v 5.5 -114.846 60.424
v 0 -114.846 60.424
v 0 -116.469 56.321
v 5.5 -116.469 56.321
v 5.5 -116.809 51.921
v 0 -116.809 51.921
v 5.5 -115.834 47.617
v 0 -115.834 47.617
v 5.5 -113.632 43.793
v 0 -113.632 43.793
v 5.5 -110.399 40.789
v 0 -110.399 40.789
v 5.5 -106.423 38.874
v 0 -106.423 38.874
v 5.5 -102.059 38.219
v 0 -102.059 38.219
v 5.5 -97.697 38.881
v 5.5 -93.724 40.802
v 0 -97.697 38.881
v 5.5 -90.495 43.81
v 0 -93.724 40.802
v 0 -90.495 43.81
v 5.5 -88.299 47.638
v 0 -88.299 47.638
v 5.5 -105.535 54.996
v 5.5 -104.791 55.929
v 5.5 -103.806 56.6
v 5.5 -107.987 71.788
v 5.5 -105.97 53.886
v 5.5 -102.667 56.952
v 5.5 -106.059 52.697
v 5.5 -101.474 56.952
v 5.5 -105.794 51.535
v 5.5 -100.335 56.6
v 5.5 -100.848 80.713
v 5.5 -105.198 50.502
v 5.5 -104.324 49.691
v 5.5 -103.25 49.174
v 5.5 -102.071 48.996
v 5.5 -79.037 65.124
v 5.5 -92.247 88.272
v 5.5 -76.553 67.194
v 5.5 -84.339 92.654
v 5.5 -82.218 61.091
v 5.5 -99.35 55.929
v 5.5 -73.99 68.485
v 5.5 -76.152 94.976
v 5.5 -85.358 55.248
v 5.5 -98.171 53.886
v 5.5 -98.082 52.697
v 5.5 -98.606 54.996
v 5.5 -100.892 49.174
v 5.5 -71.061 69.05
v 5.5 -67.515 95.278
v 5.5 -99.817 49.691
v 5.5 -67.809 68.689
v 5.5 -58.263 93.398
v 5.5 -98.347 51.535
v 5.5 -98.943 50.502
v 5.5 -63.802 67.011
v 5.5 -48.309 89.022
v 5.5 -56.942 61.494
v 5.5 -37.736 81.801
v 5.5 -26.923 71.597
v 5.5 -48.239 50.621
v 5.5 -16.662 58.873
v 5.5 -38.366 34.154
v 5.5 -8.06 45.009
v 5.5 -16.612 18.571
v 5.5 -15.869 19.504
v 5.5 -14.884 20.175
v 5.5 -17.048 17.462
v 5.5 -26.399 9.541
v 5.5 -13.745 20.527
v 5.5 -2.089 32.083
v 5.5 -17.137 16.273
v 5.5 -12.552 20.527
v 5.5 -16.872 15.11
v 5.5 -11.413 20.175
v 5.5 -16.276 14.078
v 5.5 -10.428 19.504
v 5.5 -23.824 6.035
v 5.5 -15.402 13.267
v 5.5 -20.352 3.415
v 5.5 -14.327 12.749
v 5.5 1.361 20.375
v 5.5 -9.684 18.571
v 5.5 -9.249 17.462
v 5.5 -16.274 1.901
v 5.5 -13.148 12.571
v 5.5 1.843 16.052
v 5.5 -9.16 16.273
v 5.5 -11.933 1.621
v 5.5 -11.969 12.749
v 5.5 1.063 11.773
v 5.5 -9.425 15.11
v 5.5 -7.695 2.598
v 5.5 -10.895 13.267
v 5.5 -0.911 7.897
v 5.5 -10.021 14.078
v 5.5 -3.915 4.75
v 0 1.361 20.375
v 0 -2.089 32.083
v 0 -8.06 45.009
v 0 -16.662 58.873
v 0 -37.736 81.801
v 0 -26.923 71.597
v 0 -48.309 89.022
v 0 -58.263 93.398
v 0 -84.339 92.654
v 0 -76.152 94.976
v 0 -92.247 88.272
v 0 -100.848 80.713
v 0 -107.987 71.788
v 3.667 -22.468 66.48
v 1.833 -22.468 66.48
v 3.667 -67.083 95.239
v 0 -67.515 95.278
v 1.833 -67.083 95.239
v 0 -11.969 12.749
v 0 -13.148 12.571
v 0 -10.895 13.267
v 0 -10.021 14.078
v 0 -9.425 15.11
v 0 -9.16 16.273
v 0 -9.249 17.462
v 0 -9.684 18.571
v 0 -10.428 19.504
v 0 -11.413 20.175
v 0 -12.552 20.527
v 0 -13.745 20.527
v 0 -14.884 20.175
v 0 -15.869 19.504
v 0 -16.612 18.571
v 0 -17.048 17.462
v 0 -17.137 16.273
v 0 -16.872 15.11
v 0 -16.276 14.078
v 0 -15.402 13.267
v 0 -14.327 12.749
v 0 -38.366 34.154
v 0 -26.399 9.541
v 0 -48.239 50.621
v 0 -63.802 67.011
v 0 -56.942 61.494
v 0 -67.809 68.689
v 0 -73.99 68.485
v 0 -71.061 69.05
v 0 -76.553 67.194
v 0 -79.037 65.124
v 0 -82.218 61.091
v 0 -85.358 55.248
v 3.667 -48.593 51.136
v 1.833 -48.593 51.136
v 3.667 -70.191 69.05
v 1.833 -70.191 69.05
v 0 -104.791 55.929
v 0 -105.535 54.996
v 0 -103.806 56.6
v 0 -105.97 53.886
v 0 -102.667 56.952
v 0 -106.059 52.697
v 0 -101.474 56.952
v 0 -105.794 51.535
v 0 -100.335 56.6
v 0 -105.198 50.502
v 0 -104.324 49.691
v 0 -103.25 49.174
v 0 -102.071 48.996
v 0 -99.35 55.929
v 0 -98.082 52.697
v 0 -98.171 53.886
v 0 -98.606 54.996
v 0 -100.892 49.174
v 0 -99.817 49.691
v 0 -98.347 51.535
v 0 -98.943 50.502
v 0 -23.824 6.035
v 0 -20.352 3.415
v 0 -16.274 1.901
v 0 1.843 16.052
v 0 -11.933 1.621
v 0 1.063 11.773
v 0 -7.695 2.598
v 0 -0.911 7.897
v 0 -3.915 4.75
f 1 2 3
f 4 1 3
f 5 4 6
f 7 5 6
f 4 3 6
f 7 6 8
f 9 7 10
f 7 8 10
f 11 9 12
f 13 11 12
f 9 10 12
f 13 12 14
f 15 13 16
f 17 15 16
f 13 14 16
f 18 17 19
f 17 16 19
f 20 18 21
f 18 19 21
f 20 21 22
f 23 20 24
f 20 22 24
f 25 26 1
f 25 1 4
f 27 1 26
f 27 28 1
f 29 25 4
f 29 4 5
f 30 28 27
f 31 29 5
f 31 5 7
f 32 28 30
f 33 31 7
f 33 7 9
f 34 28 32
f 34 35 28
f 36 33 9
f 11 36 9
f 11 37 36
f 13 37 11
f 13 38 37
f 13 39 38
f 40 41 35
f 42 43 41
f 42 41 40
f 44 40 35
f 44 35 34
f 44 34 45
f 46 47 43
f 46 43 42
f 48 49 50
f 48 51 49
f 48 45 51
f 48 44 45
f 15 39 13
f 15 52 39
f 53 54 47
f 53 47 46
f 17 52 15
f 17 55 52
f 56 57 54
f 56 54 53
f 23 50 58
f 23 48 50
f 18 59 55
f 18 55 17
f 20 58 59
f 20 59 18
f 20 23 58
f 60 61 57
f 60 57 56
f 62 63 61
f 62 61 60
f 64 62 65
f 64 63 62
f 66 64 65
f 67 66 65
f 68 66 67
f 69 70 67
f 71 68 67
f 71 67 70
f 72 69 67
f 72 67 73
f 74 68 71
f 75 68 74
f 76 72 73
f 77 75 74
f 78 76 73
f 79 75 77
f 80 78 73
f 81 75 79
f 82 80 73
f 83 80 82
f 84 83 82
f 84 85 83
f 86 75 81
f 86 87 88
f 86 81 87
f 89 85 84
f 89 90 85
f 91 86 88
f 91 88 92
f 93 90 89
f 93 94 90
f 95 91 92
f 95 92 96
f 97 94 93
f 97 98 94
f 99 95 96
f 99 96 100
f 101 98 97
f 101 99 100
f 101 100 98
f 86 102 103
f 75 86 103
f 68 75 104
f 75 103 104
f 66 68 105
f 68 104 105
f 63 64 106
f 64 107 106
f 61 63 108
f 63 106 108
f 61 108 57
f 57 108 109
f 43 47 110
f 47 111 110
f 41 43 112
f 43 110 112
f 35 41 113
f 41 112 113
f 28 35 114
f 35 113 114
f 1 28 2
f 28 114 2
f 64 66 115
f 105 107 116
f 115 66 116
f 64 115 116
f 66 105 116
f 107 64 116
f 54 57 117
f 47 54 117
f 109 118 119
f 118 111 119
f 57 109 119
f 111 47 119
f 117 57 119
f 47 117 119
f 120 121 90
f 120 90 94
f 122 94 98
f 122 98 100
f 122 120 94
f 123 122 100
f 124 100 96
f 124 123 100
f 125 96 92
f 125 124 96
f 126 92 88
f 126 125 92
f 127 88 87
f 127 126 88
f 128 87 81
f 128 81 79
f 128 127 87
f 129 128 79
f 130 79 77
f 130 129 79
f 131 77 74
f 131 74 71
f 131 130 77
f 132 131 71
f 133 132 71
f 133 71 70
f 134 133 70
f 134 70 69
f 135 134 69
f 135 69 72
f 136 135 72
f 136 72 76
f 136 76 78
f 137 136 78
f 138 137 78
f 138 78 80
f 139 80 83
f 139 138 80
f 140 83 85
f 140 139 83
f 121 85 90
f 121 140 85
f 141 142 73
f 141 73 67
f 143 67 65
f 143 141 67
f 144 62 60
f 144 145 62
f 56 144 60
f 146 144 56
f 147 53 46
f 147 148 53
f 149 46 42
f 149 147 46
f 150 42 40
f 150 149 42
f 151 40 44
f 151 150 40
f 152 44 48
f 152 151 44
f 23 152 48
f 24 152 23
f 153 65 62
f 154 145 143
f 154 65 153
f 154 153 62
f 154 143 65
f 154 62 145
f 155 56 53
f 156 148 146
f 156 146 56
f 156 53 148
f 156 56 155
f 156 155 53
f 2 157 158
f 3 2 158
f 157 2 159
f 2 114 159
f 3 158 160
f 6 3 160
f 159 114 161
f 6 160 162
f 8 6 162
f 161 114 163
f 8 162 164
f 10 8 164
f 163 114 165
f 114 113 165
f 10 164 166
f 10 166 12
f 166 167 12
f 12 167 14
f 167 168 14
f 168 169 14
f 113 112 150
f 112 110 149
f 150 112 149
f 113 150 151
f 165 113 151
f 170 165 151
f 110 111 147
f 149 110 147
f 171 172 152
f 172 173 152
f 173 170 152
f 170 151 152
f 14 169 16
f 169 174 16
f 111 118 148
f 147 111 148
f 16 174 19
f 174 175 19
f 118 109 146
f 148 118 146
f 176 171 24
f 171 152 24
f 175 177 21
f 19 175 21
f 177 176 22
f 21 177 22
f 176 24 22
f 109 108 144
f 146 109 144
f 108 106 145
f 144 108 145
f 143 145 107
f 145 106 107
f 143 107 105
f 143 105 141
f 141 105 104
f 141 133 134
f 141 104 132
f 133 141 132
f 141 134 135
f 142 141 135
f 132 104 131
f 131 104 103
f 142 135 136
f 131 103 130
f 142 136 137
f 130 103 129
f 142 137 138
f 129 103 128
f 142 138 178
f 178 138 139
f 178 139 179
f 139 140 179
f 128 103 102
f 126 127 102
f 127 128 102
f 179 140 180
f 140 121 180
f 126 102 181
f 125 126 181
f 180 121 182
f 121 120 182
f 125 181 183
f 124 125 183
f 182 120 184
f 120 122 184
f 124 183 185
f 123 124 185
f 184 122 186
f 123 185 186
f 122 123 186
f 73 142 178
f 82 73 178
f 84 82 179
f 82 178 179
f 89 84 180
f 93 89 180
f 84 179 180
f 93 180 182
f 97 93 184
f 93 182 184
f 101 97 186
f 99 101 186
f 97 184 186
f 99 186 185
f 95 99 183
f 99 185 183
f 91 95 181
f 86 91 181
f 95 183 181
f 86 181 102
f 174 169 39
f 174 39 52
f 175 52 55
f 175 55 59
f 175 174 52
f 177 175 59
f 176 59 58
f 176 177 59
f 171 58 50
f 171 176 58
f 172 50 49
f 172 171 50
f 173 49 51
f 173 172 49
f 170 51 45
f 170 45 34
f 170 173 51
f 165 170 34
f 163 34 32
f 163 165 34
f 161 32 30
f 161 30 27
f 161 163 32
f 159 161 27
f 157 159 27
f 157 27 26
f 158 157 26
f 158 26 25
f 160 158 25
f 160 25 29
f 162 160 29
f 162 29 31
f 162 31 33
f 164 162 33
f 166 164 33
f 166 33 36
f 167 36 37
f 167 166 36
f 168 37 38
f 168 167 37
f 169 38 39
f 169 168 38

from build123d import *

# Parameters (mm, degrees)
SKETCH_1_R      = 3.999999996
SKETCH_1_R_2    = 4
EXTRUDE_1_DEPTH = 5.5


with BuildPart() as part:
    # Эскиз1 → Вытянуть1 (new body)
    with BuildSketch(Plane(origin=(0, 0, 0), x_dir=(0, 0, -1), z_dir=(1, 0, 0))):
        with BuildLine():
            ThreePointArc((-9.540871081, -26.398646507), (-2.597990728, -7.694762203), (-20.375077368, 1.361399581))
            add(Edge.make_bspline(
                [(-20.375077368, 1.361399581), (-59.744347093, -6.195572957), (-142.43517779, -71.38922898), (-60.423943676, -114.845698035)],
                knots=[0, 0, 0, 0, 1, 1, 1, 1], degree=3))
            ThreePointArc((-60.423943676, -114.845698035), (-39.682689443, -108.483068728), (-47.637725769, -88.298914648))
            add(Edge.make_bspline(
                [(-9.540871081, -26.398646507), (-57.761471468, -47.925661264), (-93.927707693, -72.902178799), (-47.637725769, -88.298914648)],
                knots=[0, 0, 0, 0, 1, 1, 1, 1], degree=3))
        make_face()
        with Locations((-16.571481544, -13.148344)):
            Circle(SKETCH_1_R, mode=Mode.SUBTRACT)
        with Locations((-52.996333561, -102.070572255)):
            Circle(SKETCH_1_R_2, mode=Mode.SUBTRACT)
    extrude(amount=EXTRUDE_1_DEPTH)


solid = part.part
